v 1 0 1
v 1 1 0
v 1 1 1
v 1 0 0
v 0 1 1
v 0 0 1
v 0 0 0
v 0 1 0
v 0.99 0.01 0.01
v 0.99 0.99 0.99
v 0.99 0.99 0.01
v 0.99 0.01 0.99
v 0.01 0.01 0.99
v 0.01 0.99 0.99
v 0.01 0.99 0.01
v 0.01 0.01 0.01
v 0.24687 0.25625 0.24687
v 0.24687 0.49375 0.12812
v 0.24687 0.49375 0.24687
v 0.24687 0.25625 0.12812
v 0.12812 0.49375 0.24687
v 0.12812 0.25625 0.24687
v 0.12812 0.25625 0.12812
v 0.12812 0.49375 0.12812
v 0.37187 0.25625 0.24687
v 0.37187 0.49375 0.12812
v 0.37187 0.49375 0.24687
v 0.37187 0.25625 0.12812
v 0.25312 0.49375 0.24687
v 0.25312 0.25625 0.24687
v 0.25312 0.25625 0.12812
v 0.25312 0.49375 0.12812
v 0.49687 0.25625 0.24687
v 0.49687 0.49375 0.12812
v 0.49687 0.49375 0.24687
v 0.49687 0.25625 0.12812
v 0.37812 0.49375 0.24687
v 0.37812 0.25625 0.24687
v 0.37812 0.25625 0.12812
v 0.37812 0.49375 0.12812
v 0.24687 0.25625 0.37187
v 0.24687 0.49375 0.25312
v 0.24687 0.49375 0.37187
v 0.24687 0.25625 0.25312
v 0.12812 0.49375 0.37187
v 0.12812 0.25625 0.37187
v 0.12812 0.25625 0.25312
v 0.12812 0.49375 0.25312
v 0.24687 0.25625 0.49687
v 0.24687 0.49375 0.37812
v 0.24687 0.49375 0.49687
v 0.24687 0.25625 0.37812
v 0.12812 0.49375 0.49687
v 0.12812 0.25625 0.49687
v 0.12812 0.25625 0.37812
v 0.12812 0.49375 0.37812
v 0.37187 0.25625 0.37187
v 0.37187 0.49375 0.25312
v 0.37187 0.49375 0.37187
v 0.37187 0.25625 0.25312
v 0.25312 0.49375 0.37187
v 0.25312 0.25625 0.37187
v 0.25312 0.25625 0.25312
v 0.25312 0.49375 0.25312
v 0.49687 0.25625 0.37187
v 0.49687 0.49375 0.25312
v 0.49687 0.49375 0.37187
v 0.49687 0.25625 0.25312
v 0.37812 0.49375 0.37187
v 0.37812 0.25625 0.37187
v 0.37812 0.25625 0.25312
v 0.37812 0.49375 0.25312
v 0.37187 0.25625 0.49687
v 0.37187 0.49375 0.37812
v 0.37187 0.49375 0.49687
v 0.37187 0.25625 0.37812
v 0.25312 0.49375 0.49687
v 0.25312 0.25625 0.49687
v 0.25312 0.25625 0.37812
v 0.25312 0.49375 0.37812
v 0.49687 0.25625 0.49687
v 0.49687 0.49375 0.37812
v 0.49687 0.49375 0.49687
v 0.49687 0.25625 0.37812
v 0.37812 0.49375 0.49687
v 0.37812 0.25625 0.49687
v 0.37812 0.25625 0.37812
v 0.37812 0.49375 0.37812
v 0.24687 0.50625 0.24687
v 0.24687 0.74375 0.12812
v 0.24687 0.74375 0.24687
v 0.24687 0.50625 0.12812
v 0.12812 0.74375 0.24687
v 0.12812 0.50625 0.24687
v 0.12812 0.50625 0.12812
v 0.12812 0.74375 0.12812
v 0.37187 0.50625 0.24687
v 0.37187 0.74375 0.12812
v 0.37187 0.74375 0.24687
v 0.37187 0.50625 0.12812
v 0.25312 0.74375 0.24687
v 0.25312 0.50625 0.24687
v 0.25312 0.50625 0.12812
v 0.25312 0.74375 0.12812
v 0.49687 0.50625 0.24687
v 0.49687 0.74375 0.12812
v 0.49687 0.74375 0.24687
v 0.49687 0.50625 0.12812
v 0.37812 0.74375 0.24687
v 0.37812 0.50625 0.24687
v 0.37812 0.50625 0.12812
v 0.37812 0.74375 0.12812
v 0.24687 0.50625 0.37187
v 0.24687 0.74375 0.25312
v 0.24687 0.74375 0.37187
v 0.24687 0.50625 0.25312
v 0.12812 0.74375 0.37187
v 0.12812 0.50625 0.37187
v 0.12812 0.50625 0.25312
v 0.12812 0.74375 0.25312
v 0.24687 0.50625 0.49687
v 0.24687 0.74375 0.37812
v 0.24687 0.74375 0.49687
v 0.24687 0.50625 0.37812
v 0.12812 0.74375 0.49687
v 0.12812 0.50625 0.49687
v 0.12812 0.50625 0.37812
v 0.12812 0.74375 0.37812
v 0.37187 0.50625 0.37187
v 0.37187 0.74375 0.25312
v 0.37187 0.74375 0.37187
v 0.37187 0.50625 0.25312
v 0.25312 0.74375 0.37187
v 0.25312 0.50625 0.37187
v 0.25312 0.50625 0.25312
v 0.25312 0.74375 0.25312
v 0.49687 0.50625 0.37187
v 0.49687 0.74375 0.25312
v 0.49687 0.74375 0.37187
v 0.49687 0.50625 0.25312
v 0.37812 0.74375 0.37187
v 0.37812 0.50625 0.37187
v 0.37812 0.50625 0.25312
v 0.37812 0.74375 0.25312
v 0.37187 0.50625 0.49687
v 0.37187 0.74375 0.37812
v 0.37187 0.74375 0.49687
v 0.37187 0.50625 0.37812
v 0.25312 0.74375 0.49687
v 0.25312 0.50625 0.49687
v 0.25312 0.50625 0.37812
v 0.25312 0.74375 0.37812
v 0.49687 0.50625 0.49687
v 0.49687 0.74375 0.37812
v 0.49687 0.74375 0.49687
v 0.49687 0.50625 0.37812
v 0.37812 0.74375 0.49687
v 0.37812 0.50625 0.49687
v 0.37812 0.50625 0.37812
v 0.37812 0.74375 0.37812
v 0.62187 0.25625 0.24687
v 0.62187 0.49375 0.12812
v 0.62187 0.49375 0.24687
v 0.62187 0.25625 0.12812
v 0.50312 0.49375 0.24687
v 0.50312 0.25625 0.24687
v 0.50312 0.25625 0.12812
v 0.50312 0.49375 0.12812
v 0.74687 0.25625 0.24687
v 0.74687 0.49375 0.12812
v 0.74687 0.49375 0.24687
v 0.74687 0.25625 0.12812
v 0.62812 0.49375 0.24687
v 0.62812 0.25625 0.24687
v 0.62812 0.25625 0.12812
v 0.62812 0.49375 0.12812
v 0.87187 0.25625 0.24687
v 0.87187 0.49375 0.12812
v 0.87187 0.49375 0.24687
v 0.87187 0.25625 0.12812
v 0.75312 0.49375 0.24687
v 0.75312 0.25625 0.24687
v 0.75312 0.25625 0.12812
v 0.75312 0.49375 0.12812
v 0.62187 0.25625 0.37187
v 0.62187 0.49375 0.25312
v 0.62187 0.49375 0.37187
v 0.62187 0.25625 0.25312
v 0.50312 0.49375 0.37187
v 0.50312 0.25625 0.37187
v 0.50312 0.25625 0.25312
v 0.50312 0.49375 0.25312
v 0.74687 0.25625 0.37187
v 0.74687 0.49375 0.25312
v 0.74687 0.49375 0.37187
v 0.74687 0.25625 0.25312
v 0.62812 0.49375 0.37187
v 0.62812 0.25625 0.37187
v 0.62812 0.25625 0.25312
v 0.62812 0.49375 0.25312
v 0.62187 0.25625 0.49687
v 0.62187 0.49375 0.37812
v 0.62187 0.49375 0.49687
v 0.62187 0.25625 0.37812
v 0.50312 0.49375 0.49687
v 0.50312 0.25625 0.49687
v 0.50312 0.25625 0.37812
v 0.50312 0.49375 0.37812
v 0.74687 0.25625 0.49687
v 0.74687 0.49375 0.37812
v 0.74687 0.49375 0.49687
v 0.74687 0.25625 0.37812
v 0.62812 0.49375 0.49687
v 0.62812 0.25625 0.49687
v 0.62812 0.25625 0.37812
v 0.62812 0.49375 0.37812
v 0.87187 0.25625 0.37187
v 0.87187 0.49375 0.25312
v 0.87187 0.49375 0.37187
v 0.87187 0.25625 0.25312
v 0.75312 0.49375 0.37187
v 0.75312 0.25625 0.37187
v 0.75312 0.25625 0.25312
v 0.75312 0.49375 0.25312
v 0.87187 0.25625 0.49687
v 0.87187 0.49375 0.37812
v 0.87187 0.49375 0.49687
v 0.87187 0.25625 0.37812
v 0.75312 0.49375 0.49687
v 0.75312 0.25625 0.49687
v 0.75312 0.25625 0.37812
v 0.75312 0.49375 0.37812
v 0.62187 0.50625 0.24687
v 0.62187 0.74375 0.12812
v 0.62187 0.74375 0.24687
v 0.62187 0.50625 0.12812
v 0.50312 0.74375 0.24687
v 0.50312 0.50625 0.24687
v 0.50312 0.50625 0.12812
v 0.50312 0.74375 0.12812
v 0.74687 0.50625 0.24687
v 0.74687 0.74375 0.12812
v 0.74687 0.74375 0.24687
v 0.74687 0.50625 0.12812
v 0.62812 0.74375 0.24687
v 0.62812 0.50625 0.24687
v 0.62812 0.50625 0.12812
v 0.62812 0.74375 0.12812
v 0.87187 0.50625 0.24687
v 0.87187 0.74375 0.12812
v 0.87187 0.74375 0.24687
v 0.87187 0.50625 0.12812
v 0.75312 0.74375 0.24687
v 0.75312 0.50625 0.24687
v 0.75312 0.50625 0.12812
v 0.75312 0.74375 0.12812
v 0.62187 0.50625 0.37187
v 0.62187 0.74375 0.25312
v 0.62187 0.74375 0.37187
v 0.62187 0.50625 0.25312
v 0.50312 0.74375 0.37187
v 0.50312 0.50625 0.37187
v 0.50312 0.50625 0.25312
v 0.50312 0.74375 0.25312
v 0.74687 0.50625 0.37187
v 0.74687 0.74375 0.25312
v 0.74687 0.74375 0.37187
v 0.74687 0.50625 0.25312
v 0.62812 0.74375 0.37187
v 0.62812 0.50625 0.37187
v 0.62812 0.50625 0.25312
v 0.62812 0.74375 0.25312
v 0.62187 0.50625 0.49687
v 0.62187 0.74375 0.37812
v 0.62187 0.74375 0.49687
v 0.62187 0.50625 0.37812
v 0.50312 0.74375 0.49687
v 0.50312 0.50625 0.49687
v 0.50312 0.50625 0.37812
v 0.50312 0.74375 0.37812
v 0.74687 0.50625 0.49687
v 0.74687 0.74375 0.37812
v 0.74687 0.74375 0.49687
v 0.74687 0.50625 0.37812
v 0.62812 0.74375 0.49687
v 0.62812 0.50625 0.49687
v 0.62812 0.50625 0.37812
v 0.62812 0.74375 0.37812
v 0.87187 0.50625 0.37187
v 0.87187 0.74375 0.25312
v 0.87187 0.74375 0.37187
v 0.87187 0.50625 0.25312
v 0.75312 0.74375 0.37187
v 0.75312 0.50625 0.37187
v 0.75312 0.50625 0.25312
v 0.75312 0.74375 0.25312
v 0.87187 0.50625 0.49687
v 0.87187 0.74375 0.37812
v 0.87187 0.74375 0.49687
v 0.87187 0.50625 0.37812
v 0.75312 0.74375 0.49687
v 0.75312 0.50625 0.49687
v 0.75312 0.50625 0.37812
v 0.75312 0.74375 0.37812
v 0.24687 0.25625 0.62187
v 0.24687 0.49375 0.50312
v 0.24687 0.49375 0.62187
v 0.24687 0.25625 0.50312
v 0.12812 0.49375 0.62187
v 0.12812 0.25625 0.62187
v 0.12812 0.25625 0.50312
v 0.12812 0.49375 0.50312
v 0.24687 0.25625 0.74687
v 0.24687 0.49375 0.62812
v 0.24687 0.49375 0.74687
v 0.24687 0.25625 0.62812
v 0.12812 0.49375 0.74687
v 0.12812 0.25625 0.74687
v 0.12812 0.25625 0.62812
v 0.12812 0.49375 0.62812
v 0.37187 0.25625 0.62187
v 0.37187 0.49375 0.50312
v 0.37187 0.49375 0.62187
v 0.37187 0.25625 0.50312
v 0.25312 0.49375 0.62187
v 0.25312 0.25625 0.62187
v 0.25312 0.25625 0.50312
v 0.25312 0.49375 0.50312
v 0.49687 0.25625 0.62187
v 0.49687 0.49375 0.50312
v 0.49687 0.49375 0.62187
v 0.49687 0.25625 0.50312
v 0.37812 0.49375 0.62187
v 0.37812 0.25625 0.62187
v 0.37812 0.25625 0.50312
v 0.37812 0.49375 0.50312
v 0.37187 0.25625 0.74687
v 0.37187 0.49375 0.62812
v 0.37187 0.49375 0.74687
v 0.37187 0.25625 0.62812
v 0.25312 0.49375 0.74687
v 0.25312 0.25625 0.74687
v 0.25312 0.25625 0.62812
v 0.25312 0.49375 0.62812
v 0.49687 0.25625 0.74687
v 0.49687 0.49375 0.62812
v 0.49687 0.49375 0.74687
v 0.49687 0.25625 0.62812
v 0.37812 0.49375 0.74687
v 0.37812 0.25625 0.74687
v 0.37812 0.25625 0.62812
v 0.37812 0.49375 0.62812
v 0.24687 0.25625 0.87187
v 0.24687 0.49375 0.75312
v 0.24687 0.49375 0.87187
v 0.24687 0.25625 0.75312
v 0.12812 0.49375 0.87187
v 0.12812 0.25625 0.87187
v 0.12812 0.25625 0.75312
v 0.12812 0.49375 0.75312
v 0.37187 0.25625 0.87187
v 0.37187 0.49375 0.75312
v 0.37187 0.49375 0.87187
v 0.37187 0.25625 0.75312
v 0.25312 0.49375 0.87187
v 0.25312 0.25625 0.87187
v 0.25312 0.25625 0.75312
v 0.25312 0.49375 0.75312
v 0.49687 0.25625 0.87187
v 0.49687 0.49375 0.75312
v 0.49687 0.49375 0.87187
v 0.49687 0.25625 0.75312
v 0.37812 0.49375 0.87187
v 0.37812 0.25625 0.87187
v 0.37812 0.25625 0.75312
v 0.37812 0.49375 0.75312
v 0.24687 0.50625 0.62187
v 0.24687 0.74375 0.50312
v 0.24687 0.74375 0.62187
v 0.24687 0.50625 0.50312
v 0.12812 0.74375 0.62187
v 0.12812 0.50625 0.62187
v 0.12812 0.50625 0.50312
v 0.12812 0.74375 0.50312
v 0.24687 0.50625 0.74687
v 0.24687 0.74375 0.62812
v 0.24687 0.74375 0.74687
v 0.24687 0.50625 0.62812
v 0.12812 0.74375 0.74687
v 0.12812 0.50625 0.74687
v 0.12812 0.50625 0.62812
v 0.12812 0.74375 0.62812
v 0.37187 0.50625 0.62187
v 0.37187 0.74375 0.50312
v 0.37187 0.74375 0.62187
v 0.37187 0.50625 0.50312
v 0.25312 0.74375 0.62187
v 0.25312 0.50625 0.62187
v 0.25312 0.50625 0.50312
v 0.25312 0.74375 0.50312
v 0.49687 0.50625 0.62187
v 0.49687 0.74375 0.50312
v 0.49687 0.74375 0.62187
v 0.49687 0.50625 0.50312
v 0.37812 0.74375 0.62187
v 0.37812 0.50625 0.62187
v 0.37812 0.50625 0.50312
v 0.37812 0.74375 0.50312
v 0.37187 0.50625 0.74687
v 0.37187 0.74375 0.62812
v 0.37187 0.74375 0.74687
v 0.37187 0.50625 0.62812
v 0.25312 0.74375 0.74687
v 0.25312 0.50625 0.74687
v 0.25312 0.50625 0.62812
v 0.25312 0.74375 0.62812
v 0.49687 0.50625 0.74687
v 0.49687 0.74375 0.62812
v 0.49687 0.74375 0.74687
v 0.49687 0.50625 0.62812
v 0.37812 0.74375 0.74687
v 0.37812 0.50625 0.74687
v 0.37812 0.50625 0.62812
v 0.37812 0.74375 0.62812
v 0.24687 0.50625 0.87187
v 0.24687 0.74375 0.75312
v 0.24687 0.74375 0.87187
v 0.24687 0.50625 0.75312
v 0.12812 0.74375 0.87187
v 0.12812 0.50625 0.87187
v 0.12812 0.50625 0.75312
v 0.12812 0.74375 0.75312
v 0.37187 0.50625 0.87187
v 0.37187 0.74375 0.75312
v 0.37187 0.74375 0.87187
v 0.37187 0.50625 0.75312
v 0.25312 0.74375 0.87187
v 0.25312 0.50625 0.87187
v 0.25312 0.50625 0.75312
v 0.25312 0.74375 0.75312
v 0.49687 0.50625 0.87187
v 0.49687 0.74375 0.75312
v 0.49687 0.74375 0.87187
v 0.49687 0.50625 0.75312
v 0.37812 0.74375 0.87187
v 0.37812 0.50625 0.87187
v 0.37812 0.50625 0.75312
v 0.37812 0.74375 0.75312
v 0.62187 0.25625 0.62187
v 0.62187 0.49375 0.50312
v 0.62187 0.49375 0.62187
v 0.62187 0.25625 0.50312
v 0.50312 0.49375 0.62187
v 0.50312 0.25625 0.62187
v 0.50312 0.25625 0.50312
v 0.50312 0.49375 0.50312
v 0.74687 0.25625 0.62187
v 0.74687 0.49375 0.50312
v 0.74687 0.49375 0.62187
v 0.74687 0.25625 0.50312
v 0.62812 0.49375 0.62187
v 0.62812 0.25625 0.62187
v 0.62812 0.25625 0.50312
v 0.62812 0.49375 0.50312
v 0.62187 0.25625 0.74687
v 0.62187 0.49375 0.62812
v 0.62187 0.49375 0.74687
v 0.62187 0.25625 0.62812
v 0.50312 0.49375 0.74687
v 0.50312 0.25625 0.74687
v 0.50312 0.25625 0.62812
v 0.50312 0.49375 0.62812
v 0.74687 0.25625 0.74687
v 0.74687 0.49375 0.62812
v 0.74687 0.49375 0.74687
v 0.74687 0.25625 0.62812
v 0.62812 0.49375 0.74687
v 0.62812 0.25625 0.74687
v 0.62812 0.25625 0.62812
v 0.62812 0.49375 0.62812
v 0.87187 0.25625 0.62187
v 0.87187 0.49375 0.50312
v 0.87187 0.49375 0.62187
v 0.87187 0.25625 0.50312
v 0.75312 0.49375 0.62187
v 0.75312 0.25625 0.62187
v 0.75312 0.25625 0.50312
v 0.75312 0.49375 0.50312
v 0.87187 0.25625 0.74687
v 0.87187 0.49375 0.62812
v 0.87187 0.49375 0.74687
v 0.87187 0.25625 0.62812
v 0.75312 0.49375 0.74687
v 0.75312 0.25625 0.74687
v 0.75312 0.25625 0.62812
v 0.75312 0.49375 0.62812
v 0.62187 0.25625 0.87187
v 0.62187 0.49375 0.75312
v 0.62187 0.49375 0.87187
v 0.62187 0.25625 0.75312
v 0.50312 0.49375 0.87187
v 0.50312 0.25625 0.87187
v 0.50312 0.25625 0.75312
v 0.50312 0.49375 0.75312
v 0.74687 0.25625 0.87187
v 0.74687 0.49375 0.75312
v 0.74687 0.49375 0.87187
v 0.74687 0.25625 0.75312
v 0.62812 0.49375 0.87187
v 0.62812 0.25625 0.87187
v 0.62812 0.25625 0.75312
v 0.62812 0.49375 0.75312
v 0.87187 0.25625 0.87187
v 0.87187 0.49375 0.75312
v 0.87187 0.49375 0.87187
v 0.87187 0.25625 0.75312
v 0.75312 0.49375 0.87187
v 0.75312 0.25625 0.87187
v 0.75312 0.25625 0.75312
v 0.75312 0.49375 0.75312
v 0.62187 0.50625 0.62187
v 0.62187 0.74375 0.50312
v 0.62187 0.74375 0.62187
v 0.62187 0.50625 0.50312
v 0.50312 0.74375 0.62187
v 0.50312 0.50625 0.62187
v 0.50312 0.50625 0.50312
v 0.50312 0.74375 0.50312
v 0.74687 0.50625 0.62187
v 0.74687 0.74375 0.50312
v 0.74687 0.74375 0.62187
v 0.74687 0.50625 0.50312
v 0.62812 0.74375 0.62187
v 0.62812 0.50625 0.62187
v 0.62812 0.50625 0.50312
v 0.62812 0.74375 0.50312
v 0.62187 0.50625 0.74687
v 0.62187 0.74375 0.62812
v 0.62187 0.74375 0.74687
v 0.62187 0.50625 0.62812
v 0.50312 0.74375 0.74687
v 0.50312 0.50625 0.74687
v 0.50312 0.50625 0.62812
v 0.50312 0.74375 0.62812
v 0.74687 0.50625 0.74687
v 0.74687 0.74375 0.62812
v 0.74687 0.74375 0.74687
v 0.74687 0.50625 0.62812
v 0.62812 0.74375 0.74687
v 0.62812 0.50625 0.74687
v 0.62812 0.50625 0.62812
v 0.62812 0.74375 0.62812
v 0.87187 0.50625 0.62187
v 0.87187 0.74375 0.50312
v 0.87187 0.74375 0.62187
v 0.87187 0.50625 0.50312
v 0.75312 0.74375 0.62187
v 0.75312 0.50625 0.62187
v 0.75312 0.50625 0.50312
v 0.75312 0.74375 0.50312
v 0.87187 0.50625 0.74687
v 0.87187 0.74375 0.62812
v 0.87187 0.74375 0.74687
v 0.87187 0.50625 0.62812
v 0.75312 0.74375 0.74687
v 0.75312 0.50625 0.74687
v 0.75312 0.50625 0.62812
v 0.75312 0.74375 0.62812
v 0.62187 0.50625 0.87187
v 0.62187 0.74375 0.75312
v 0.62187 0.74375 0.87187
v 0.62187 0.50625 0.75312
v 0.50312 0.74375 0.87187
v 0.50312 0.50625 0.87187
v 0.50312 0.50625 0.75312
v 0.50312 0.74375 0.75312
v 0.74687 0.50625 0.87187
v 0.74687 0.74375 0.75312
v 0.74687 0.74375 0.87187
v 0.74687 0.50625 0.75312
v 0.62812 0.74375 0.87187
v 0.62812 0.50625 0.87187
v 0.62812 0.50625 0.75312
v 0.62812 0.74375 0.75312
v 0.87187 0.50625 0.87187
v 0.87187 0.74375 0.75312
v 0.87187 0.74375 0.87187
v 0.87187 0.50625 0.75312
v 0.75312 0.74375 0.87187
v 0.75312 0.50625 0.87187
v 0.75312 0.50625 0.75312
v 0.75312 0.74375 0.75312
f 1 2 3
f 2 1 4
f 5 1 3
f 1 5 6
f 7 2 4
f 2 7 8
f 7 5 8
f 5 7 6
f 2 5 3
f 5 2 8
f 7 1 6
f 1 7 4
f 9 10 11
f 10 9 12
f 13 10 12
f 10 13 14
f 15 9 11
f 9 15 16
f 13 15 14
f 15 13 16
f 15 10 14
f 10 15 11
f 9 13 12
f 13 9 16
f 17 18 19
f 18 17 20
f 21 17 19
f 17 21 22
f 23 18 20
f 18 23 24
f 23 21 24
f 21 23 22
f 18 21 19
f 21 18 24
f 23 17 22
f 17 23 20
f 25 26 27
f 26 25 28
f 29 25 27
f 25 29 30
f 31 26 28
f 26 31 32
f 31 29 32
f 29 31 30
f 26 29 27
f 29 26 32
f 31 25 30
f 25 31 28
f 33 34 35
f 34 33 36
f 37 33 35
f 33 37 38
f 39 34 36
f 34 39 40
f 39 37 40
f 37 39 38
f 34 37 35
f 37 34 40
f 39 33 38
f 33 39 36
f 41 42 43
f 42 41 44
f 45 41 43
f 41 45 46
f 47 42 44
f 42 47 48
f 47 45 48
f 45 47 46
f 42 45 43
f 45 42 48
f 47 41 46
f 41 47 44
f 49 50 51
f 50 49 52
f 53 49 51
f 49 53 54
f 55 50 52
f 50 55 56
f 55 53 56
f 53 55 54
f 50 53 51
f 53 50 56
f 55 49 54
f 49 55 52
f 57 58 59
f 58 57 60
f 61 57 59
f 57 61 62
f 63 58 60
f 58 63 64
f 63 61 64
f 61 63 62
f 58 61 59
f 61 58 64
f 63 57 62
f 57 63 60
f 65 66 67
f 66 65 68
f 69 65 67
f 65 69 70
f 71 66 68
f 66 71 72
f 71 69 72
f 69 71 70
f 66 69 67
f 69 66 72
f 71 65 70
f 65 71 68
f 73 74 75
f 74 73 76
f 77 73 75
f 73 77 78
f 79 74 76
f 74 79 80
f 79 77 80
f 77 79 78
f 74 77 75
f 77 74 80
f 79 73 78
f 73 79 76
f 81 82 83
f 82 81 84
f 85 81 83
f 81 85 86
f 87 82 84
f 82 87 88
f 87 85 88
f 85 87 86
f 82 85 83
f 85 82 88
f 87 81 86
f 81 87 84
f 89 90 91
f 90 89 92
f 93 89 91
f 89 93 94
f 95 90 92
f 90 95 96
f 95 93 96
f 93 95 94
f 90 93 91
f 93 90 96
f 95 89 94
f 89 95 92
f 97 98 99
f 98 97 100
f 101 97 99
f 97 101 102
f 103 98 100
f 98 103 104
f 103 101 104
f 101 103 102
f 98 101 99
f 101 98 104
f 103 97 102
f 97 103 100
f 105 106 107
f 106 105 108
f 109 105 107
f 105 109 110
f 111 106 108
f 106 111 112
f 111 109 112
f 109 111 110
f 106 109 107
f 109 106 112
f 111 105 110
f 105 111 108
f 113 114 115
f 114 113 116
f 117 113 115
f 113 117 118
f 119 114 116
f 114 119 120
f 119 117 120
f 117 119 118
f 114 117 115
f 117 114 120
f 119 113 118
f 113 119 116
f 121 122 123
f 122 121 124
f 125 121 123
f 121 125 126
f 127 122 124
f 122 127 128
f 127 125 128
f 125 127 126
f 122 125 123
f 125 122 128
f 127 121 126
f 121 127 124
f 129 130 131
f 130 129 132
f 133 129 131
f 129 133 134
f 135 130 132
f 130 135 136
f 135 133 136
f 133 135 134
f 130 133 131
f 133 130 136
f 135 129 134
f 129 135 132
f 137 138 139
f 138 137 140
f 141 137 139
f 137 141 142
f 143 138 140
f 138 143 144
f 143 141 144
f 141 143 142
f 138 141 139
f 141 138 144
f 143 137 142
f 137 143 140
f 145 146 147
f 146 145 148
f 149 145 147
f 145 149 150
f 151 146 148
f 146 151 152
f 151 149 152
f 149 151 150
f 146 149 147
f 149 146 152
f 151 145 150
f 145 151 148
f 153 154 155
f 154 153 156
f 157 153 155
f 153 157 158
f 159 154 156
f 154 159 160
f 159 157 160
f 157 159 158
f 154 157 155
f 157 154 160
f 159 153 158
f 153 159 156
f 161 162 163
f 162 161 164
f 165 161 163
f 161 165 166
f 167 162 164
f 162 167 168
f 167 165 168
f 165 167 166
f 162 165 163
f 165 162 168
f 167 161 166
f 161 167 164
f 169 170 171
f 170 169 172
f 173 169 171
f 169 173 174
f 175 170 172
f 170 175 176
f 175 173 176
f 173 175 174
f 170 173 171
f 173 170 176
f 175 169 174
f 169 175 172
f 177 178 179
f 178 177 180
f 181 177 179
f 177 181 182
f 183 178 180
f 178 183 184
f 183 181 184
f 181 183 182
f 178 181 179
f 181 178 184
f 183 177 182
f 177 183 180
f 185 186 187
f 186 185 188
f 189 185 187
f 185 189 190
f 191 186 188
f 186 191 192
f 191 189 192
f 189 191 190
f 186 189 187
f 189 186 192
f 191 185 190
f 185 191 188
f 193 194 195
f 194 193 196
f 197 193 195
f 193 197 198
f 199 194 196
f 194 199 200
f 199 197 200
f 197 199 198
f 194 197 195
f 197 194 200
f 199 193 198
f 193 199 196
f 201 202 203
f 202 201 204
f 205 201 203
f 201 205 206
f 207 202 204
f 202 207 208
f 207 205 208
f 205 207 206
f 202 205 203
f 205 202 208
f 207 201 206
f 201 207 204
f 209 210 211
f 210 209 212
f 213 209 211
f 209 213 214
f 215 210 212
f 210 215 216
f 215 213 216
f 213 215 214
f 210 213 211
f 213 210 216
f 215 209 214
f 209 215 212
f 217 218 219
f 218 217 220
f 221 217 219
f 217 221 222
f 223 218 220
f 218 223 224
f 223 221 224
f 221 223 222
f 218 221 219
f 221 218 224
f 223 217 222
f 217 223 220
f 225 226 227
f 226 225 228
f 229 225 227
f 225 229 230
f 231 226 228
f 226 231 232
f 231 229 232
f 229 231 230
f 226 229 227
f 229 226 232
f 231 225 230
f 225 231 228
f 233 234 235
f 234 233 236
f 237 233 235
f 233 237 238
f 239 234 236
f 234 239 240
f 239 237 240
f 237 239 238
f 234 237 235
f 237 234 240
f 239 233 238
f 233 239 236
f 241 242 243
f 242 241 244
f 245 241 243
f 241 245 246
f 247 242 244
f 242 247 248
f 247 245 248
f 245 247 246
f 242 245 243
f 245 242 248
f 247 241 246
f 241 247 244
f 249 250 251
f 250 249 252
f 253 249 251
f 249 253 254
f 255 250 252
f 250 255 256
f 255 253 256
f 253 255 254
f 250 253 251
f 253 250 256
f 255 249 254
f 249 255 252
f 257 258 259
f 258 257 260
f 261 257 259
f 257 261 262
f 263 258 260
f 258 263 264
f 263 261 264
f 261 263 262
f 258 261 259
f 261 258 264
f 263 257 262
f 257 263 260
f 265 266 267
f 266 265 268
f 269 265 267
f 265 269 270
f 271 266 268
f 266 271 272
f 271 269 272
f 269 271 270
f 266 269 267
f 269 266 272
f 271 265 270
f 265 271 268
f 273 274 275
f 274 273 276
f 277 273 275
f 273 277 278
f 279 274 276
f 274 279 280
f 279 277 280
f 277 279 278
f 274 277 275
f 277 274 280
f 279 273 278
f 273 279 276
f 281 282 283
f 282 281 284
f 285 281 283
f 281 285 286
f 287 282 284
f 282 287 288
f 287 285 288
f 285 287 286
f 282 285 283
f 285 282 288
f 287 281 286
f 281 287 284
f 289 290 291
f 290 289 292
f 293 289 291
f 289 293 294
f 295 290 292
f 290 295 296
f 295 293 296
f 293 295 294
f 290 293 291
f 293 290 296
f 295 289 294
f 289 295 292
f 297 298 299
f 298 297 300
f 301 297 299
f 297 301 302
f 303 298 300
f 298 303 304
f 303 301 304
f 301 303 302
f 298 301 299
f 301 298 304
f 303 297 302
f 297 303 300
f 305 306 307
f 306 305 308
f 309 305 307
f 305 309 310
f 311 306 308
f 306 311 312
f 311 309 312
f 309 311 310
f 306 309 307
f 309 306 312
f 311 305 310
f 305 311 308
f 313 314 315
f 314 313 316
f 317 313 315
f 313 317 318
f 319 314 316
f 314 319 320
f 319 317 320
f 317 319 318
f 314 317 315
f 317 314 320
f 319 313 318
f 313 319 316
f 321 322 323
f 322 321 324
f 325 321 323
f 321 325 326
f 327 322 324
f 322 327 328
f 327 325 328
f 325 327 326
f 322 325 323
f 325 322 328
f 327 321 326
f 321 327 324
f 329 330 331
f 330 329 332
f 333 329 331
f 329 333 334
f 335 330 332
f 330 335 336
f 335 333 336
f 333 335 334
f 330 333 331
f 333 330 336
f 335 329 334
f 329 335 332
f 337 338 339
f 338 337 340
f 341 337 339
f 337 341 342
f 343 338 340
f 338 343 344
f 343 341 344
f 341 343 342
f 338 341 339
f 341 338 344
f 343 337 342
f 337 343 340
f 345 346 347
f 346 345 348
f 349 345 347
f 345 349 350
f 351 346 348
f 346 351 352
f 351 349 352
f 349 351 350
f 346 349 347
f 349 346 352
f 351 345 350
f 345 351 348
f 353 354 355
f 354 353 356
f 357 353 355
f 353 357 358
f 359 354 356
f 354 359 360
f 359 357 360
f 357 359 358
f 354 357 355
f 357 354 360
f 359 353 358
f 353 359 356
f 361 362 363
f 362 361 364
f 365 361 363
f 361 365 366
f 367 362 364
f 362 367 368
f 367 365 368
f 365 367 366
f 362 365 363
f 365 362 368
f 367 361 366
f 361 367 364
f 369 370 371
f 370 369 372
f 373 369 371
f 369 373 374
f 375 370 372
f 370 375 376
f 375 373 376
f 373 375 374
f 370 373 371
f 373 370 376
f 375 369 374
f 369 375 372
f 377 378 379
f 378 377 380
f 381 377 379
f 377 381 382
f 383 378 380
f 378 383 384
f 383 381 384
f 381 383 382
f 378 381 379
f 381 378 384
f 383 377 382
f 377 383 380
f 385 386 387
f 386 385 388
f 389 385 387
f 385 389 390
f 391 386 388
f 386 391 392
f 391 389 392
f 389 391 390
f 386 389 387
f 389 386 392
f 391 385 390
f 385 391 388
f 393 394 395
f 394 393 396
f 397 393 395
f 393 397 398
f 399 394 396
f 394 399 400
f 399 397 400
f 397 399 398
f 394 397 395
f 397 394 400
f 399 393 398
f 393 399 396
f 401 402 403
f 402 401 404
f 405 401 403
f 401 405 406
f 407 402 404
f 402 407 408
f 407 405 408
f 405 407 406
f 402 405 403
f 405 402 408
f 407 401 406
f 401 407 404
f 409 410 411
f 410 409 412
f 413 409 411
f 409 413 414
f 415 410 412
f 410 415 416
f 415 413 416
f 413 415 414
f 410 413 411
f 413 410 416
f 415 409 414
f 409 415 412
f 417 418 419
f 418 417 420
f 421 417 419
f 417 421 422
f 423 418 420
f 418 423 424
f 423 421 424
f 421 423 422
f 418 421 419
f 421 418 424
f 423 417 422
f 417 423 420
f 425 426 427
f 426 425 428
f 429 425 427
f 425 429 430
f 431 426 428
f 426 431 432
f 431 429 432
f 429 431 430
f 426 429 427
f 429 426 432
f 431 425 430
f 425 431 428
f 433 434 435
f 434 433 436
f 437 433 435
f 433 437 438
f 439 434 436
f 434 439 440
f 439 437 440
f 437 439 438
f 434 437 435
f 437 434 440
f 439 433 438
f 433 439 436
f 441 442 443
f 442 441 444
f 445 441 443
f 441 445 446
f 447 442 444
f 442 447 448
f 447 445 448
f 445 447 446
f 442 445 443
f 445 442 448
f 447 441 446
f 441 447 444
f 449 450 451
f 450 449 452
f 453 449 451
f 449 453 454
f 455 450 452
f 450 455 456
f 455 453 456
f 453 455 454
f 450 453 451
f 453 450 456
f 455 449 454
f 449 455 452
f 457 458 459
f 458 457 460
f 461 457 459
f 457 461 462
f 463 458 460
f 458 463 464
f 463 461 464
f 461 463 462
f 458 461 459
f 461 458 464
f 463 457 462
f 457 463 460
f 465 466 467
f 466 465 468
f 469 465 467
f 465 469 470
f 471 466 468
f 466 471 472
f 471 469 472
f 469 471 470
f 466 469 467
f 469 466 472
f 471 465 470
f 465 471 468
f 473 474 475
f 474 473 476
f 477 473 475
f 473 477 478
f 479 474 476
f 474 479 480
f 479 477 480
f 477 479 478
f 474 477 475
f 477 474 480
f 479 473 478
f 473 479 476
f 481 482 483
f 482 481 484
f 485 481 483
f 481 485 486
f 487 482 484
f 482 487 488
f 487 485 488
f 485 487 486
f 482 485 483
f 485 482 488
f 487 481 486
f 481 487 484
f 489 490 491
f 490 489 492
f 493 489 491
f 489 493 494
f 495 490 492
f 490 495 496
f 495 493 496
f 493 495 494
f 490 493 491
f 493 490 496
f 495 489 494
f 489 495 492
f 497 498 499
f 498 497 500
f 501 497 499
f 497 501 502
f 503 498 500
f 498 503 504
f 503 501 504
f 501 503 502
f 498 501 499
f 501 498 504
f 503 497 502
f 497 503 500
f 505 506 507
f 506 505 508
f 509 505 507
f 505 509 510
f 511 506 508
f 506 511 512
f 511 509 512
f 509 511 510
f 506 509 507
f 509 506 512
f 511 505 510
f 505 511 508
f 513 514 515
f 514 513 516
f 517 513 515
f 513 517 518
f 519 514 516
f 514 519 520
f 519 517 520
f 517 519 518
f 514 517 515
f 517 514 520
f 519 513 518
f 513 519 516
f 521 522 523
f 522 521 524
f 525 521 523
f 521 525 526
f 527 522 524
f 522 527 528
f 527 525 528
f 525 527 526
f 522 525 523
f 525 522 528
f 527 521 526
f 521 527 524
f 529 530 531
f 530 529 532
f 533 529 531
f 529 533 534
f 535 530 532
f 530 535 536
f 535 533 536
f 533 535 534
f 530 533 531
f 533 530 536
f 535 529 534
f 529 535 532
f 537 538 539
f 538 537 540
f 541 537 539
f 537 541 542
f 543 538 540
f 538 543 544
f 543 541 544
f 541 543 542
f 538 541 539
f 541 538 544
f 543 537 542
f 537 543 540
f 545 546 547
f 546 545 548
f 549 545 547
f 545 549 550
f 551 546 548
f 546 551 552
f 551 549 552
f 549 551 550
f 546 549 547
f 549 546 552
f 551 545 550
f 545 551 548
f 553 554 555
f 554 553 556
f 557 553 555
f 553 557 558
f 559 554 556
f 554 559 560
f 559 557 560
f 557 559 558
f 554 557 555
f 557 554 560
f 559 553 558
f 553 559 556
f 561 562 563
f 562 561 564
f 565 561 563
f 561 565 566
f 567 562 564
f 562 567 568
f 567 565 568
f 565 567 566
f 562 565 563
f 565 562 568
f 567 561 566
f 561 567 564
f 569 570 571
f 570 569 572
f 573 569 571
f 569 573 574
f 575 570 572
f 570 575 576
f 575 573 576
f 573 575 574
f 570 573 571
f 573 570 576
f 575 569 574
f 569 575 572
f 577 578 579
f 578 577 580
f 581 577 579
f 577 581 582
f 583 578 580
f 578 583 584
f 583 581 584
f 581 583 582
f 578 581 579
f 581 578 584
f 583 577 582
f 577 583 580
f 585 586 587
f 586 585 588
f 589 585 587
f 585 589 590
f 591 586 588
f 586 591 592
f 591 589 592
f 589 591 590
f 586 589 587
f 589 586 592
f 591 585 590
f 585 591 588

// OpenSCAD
translate([0.1875, 0.375, 0.1875]) color([0.46172403122036343, 0.8112549353393549, 0.5262901013183428]) cube([0.11875, 0.2375, 0.11875], center=true);
translate([0.3125, 0.375, 0.1875]) color([0.5473991440672151, 0.8391593053220191, 0.30875394961575564]) cube([0.11875, 0.2375, 0.11875], center=true);
translate([0.4375, 0.375, 0.1875]) color([0.2700743072812817, 0.7917610089784592, 0.400459630936148]) cube([0.11875, 0.2375, 0.11875], center=true);
translate([0.1875, 0.375, 0.3125]) color([0.5808141345780946, 0.1907749706612215, 0.9132349676213395]) cube([0.11875, 0.2375, 0.11875], center=true);
translate([0.1875, 0.375, 0.4375]) color([0.803549640739358, 0.6188581009873265, 0.48954661293697843]) cube([0.11875, 0.2375, 0.11875], center=true);
translate([0.3125, 0.375, 0.3125]) color([0.9720554877162383, 0.7215236587579602, 0.08620154695647231]) cube([0.11875, 0.2375, 0.11875], center=true);
translate([0.4375, 0.375, 0.3125]) color([0.2712460228853565, 0.997832974224577, 0.15397169914917264]) cube([0.11875, 0.2375, 0.11875], center=true);
translate([0.3125, 0.375, 0.4375]) color([0.04867093423257651, 0.5831385996168909, 0.2163005367487646]) cube([0.11875, 0.2375, 0.11875], center=true);
translate([0.4375, 0.375, 0.4375]) color([0.8199063943610959, 0.8883717173614907, 0.10543411712616935]) cube([0.11875, 0.2375, 0.11875], center=true);
translate([0.1875, 0.625, 0.1875]) color([0.8645557323014031, 0.12246173870871391, 0.7978576761344572]) cube([0.11875, 0.2375, 0.11875], center=true);
translate([0.3125, 0.625, 0.1875]) color([0.6861997168208607, 0.8815922823038128, 0.8864052580619038]) cube([0.11875, 0.2375, 0.11875], center=true);
translate([0.4375, 0.625, 0.1875]) color([0.4085129362080424, 0.5497764341745511, 0.7974996991044209]) cube([0.11875, 0.2375, 0.11875], center=true);
translate([0.1875, 0.625, 0.3125]) color([0.5123083473513786, 0.3381299602198028, 0.4822948245633474]) cube([0.11875, 0.2375, 0.11875], center=true);
translate([0.1875, 0.625, 0.4375]) color([0.7342936389933408, 0.08274489693014742, 0.8453351111930059]) cube([0.11875, 0.2375, 0.11875], center=true);
translate([0.3125, 0.625, 0.3125]) color([0.07725072320580417, 0.4548705713249376, 0.710866921316589]) cube([0.11875, 0.2375, 0.11875], center=true);
translate([0.4375, 0.625, 0.3125]) color([0.8122754816630242, 0.1852612983135129, 0.04315866454607564]) cube([0.11875, 0.2375, 0.11875], center=true);
translate([0.3125, 0.625, 0.4375]) color([0.54874333810742, 0.37944405628182243, 0.7587369215261842]) cube([0.11875, 0.2375, 0.11875], center=true);
translate([0.4375, 0.625, 0.4375]) color([0.694767708379466, 0.7755225772982934, 0.6103982831117337]) cube([0.11875, 0.2375, 0.11875], center=true);
translate([0.5625, 0.375, 0.1875]) color([0.44715520772970396, 0.7646103509363633, 0.13417439454920832]) cube([0.11875, 0.2375, 0.11875], center=true);
translate([0.6875, 0.375, 0.1875]) color([0.17709951365257492, 0.19633895605029428, 0.9229711272000287]) cube([0.11875, 0.2375, 0.11875], center=true);
translate([0.8125, 0.375, 0.1875]) color([0.5789111867927059, 0.5936685213034114, 0.23122657145852998]) cube([0.11875, 0.2375, 0.11875], center=true);
translate([0.5625, 0.375, 0.3125]) color([0.09701929127677045, 0.5329590088083158, 0.5863600265986552]) cube([0.11875, 0.2375, 0.11875], center=true);
translate([0.6875, 0.375, 0.3125]) color([0.32169364952457713, 0.11650458491430882, 0.20827418393676]) cube([0.11875, 0.2375, 0.11875], center=true);
translate([0.5625, 0.375, 0.4375]) color([0.24094306751544292, 0.738831858130403, 0.2692517143505504]) cube([0.11875, 0.2375, 0.11875], center=true);
translate([0.6875, 0.375, 0.4375]) color([0.2455727835192727, 0.38770141795613733, 0.9478694897502455]) cube([0.11875, 0.2375, 0.11875], center=true);
translate([0.8125, 0.375, 0.3125]) color([0.24147571444375404, 0.7589163243996708, 0.31579535526069014]) cube([0.11875, 0.2375, 0.11875], center=true);
translate([0.8125, 0.375, 0.4375]) color([0.8463164953494714, 0.6788679680466893, 0.9968459963407242]) cube([0.11875, 0.2375, 0.11875], center=true);
translate([0.5625, 0.625, 0.1875]) color([0.7036490926432553, 0.9981326158072686, 0.2503783098774546]) cube([0.11875, 0.2375, 0.11875], center=true);
translate([0.6875, 0.625, 0.1875]) color([0.15300159367917932, 0.7111144422342732, 0.12574150070547752]) cube([0.11875, 0.2375, 0.11875], center=true);
translate([0.8125, 0.625, 0.1875]) color([0.6893836107366527, 0.8049542535871942, 0.5878251953756715]) cube([0.11875, 0.2375, 0.11875], center=true);
translate([0.5625, 0.625, 0.3125]) color([0.2713503643049362, 0.7804407243314248, 0.3660172137187989]) cube([0.11875, 0.2375, 0.11875], center=true);
translate([0.6875, 0.625, 0.3125]) color([0.18587356943446887, 0.22463196643641792, 0.4849973753957538]) cube([0.11875, 0.2375, 0.11875], center=true);
translate([0.5625, 0.625, 0.4375]) color([0.14919490450180428, 0.9428813815597845, 0.17510965502019282]) cube([0.11875, 0.2375, 0.11875], center=true);
translate([0.6875, 0.625, 0.4375]) color([0.948369968283141, 0.6061679132205043, 0.8023904543244383]) cube([0.11875, 0.2375, 0.11875], center=true);
translate([0.8125, 0.625, 0.3125]) color([0.5227990918106961, 0.46497642784858184, 0.41545539240624885]) cube([0.11875, 0.2375, 0.11875], center=true);
translate([0.8125, 0.625, 0.4375]) color([0.12102582217364766, 0.6150265163791653, 0.47355111216356927]) cube([0.11875, 0.2375, 0.11875], center=true);
translate([0.1875, 0.375, 0.5625]) color([0.41670532407941085, 0.425345680111462, 0.7907863107789563]) cube([0.11875, 0.2375, 0.11875], center=true);
translate([0.1875, 0.375, 0.6875]) color([0.6126428856407916, 0.2737647079796258, 0.693344578621807]) cube([0.11875, 0.2375, 0.11875], center=true);
translate([0.3125, 0.375, 0.5625]) color([0.5794216814438241, 0.8809414275444518, 0.8426516508652041]) cube([0.11875, 0.2375, 0.11875], center=true);
translate([0.4375, 0.375, 0.5625]) color([0.8801612922603782, 0.08607486984137092, 0.7780420565876001]) cube([0.11875, 0.2375, 0.11875], center=true);
translate([0.3125, 0.375, 0.6875]) color([0.3999241673751073, 0.7781768293822428, 0.17994174312030797]) cube([0.11875, 0.2375, 0.11875], center=true);
translate([0.4375, 0.375, 0.6875]) color([0.8612539028001464, 0.20612804304271737, 0.0716566971794208]) cube([0.11875, 0.2375, 0.11875], center=true);
translate([0.1875, 0.375, 0.8125]) color([0.07357161469597906, 0.6122625706172512, 0.47233280024488156]) cube([0.11875, 0.2375, 0.11875], center=true);
translate([0.3125, 0.375, 0.8125]) color([0.39290555549602224, 0.994915172949262, 0.8592286834202727]) cube([0.11875, 0.2375, 0.11875], center=true);
translate([0.4375, 0.375, 0.8125]) color([0.22041646972872964, 0.8819223083479422, 0.8797647989808851]) cube([0.11875, 0.2375, 0.11875], center=true);
translate([0.1875, 0.625, 0.5625]) color([0.09314761773743008, 0.6896195509922893, 0.008992133453294526]) cube([0.11875, 0.2375, 0.11875], center=true);
translate([0.1875, 0.625, 0.6875]) color([0.5648256285798902, 0.11017783112903601, 0.9331629341791823]) cube([0.11875, 0.2375, 0.11875], center=true);
translate([0.3125, 0.625, 0.5625]) color([0.285732093058915, 0.9972907082686906, 0.43035138041270127]) cube([0.11875, 0.2375, 0.11875], center=true);
translate([0.4375, 0.625, 0.5625]) color([0.023233455433319117, 0.06871308575857826, 0.5453747216879481]) cube([0.11875, 0.2375, 0.11875], center=true);
translate([0.3125, 0.625, 0.6875]) color([0.8984396286425499, 0.5859064616194529, 0.7449753720931842]) cube([0.11875, 0.2375, 0.11875], center=true);
translate([0.4375, 0.625, 0.6875]) color([0.2707752699193896, 0.8459477489491674, 0.09132789456200907]) cube([0.11875, 0.2375, 0.11875], center=true);
translate([0.1875, 0.625, 0.8125]) color([0.6247581279428744, 0.47934345048609295, 0.5947774585800618]) cube([0.11875, 0.2375, 0.11875], center=true);
translate([0.3125, 0.625, 0.8125]) color([0.0966219920005903, 0.9479164624195787, 0.03867810307276098]) cube([0.11875, 0.2375, 0.11875], center=true);
translate([0.4375, 0.625, 0.8125]) color([0.512835063744571, 0.053860311320736765, 0.30390044531159677]) cube([0.11875, 0.2375, 0.11875], center=true);
translate([0.5625, 0.375, 0.5625]) color([0.5358495200642227, 0.9581886502434868, 0.15063066354102805]) cube([0.11875, 0.2375, 0.11875], center=true);
translate([0.6875, 0.375, 0.5625]) color([0.1394220362982439, 0.637424855918313, 0.017001375499370308]) cube([0.11875, 0.2375, 0.11875], center=true);
translate([0.5625, 0.375, 0.6875]) color([0.9377550820767451, 0.10704945280218559, 0.012974712303721159]) cube([0.11875, 0.2375, 0.11875], center=true);
translate([0.6875, 0.375, 0.6875]) color([0.6828930691735134, 0.21575444737763683, 0.7518975959475263]) cube([0.11875, 0.2375, 0.11875], center=true);
translate([0.8125, 0.375, 0.5625]) color([0.2208957801718262, 0.27965542355534123, 0.48547641402265196]) cube([0.11875, 0.2375, 0.11875], center=true);
translate([0.8125, 0.375, 0.6875]) color([0.7746477988255035, 0.42685371509966563, 0.004537012660128847]) cube([0.11875, 0.2375, 0.11875], center=true);
translate([0.5625, 0.375, 0.8125]) color([0.8958040859934125, 0.32646365561422697, 0.6558366973263319]) cube([0.11875, 0.2375, 0.11875], center=true);
translate([0.6875, 0.375, 0.8125]) color([0.2999215004668262, 0.24047631377962675, 0.888472330839678]) cube([0.11875, 0.2375, 0.11875], center=true);
translate([0.8125, 0.375, 0.8125]) color([0.27511158803496616, 0.48498926117814256, 0.24069895137980524]) cube([0.11875, 0.2375, 0.11875], center=true);
translate([0.5625, 0.625, 0.5625]) color([0.5644076030056127, 0.6013130228959247, 0.32784247344869977]) cube([0.11875, 0.2375, 0.11875], center=true);
translate([0.6875, 0.625, 0.5625]) color([0.10332499460836353, 0.45449244433031355, 0.5491957598214638]) cube([0.11875, 0.2375, 0.11875], center=true);
translate([0.5625, 0.625, 0.6875]) color([0.5728258837849703, 0.8403578958934066, 0.6982731030474273]) cube([0.11875, 0.2375, 0.11875], center=true);
translate([0.6875, 0.625, 0.6875]) color([0.744308802772652, 0.7916154232432334, 0.5956182142848017]) cube([0.11875, 0.2375, 0.11875], center=true);
translate([0.8125, 0.625, 0.5625]) color([0.30884718226322827, 0.1561086729656712, 0.5833011610744269]) cube([0.11875, 0.2375, 0.11875], center=true);
translate([0.8125, 0.625, 0.6875]) color([0.5091085760857007, 0.2717177888884632, 0.9779894411811328]) cube([0.11875, 0.2375, 0.11875], center=true);
translate([0.5625, 0.625, 0.8125]) color([0.6249697853011126, 0.1412589883945864, 0.5315062740206121]) cube([0.11875, 0.2375, 0.11875], center=true);
translate([0.6875, 0.625, 0.8125]) color([0.5710134097643395, 0.25063752032270836, 0.1616047095065578]) cube([0.11875, 0.2375, 0.11875], center=true);
translate([0.8125, 0.625, 0.8125]) color([0.649882641178458, 0.07676307518082648, 0.795763250406789]) cube([0.11875, 0.2375, 0.11875], center=true);
color([0.3,0.3,0.3,0.3]) difference() { cube([1,1,1]); translate([0.01,0.01,0.01]) cube([0.98,0.98,0.98]); }
